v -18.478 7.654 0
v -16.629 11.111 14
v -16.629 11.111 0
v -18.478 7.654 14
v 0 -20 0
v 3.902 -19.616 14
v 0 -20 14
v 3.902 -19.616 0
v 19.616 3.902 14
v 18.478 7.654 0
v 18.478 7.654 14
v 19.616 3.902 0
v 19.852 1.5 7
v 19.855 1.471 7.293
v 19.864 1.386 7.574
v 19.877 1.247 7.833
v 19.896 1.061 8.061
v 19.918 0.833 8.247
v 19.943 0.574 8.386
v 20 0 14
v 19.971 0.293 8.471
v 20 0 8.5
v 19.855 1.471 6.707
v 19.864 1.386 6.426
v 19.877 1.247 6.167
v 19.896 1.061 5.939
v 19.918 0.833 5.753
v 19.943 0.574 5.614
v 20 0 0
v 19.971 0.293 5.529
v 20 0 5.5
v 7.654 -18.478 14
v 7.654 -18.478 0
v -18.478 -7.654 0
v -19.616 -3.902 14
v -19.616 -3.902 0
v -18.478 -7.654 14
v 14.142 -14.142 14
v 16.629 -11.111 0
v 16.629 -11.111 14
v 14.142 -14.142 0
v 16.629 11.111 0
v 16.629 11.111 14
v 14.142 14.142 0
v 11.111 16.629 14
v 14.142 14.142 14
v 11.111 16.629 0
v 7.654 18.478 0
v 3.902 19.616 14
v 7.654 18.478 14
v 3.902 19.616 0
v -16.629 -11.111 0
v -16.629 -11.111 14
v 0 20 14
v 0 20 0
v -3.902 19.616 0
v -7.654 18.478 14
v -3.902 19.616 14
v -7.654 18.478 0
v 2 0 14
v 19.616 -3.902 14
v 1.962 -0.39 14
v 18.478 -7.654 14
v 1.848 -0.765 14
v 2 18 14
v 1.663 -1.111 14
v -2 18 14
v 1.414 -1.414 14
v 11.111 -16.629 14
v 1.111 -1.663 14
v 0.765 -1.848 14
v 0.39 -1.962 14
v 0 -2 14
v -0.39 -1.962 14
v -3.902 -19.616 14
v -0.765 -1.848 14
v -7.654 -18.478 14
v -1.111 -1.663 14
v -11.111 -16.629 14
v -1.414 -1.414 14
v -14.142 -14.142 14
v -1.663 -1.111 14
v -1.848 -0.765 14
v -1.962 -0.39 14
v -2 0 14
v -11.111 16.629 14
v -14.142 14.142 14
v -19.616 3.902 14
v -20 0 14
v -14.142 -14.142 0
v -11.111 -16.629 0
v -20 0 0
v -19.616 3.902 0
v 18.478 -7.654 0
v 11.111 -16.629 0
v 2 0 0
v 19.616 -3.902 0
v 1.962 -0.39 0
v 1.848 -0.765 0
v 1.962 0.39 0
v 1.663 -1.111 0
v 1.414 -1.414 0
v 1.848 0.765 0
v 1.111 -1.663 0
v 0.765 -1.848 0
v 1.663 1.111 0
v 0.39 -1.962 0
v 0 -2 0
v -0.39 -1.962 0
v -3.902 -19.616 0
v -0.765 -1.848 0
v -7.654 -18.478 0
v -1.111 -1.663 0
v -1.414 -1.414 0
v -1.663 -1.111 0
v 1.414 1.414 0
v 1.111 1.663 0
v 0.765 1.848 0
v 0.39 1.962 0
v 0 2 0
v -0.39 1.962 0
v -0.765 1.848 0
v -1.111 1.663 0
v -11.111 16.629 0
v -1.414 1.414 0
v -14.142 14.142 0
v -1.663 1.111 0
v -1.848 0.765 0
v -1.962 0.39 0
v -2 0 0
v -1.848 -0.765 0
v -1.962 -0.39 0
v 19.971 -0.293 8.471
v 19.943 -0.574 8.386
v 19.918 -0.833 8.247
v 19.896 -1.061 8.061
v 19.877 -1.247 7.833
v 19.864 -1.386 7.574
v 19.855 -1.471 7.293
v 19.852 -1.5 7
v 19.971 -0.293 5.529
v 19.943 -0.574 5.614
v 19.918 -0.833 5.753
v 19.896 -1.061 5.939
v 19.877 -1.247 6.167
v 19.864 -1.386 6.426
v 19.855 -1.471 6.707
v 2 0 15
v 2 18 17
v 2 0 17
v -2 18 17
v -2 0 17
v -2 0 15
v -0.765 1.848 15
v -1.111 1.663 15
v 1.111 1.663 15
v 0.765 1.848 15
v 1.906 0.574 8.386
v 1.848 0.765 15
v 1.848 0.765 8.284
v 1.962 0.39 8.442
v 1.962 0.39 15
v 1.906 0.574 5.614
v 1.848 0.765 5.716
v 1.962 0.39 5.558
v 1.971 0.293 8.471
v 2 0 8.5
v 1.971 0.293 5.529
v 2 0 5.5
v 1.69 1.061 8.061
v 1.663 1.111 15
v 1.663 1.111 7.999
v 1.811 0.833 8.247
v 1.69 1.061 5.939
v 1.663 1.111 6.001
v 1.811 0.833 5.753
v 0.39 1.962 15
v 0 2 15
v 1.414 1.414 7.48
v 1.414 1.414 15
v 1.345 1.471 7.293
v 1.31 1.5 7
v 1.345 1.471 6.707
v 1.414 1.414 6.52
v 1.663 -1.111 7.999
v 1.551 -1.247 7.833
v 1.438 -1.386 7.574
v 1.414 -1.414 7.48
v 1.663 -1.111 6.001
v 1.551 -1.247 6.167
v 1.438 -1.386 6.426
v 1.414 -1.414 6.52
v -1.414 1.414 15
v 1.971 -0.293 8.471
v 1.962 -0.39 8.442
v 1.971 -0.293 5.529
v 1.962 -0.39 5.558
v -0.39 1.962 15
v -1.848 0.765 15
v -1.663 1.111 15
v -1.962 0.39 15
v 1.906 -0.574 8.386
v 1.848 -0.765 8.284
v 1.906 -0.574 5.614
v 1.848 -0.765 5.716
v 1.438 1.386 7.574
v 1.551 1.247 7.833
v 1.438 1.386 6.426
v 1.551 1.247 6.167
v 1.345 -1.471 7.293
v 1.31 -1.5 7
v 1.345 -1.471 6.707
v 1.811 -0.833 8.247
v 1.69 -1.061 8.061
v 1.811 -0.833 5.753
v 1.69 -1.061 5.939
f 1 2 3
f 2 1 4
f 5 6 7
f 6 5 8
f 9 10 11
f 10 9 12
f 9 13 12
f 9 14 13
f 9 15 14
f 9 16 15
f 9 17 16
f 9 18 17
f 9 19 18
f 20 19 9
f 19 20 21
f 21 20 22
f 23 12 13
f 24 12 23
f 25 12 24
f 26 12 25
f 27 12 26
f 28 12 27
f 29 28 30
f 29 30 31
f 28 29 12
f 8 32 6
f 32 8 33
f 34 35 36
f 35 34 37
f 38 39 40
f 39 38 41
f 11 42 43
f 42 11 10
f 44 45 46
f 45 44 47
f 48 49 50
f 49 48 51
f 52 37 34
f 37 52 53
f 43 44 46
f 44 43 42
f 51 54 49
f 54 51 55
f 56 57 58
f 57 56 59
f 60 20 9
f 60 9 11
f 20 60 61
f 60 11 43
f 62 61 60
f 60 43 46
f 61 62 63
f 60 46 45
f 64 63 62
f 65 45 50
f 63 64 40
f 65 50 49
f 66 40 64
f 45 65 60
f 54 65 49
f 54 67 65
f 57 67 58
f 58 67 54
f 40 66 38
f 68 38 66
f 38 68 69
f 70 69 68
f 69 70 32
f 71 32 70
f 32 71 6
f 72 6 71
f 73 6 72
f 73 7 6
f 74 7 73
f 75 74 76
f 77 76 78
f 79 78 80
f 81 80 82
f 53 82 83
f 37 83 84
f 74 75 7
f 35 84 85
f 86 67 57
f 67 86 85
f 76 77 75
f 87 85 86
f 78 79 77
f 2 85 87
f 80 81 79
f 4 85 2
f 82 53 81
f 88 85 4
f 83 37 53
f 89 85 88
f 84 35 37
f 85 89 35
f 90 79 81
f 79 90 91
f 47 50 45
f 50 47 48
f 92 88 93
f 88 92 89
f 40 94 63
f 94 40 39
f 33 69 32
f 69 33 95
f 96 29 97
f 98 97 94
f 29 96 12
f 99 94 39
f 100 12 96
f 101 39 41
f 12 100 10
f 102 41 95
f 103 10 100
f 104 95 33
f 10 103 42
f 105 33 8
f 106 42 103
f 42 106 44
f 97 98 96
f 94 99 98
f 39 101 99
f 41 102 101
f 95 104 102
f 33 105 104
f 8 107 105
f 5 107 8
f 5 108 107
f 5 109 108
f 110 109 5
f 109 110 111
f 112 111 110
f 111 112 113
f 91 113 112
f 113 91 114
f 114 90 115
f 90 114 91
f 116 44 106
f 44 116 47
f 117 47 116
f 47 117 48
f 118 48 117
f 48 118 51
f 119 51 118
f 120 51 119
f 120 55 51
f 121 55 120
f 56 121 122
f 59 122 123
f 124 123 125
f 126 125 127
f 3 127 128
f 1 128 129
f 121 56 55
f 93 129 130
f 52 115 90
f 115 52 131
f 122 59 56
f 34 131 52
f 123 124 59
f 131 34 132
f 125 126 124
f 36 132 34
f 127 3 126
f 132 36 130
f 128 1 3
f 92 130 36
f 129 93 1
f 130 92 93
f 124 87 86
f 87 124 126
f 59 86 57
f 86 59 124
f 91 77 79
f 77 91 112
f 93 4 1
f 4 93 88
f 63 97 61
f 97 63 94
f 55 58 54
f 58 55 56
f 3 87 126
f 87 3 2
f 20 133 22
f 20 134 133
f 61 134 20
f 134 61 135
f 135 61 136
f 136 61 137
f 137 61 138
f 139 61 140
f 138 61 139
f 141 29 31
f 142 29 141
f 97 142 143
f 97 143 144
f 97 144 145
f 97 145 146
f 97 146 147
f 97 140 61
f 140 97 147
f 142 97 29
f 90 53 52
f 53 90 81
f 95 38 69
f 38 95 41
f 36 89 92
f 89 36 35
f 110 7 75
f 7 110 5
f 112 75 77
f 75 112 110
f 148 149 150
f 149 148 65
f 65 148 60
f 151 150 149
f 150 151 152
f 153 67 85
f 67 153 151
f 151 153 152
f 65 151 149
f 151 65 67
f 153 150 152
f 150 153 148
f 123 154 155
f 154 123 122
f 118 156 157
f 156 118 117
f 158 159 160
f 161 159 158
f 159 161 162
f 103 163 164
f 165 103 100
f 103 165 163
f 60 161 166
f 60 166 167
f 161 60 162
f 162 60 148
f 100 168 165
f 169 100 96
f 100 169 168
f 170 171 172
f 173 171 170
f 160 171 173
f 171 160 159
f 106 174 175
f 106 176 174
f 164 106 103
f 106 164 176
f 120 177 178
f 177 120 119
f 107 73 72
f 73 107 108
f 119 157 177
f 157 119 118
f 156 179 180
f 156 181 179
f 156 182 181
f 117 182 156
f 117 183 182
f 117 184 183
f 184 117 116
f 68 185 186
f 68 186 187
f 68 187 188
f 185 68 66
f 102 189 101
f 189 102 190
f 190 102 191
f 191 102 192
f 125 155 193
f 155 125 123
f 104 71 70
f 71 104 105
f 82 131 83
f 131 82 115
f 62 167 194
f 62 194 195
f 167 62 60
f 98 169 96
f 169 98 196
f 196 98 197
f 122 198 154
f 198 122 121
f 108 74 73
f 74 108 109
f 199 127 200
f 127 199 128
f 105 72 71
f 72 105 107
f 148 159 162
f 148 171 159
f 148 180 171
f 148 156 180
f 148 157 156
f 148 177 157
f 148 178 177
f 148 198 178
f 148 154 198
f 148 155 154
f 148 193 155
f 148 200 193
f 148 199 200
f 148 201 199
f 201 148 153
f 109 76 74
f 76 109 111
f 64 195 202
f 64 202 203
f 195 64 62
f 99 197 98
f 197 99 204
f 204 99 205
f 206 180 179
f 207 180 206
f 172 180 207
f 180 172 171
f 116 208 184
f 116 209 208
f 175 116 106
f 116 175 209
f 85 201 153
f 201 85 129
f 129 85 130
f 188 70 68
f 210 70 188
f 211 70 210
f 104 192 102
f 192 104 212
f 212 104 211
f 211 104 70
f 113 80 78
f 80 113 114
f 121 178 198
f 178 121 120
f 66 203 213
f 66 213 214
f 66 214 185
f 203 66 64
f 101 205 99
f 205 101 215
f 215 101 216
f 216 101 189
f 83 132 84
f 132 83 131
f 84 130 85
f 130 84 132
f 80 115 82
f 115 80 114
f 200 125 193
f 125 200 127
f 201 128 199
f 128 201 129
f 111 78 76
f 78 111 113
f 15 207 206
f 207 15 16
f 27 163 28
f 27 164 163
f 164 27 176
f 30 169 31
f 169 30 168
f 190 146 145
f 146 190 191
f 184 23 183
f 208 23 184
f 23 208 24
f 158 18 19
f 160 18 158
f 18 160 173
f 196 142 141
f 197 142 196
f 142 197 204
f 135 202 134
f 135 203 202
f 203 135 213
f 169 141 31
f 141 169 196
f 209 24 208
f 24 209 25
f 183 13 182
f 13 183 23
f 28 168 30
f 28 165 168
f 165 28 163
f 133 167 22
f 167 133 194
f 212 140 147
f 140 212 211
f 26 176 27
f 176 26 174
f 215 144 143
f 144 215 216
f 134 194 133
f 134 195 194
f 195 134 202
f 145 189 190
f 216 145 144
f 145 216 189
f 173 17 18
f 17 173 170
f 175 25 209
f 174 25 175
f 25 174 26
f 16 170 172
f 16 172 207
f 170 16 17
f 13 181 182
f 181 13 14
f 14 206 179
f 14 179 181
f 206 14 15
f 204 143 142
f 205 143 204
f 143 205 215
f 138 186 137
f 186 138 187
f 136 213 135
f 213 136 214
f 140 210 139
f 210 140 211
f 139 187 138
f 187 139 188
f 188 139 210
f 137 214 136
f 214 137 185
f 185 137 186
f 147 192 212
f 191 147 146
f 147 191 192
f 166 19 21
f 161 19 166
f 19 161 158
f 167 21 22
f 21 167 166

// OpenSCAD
$fn = 32;

// ----------------------------------------------------------------------
// Control knob: pointer knob
// ----------------------------------------------------------------------

// --- parameters (mm) ---
rib_w = 4;                // pointer rib width
rib_h = 4;                // pointer rib height
knob_d = 40;              // knob body diameter
knob_h = 14;              // knob body height
bore_d = 4;               // shaft bore diameter
set_d = 3;                // set screw bore diameter
fit_tol = 0.05;           // tolerance for press fits, mm
free_tol = 0.3;           // tolerance for clearance fits, mm

rib_poke = rib_h - 1;  // rib height above the top
total_h = knob_h + rib_h - 1;  // overall height

difference() {
  union() {
    cylinder(h = knob_h, d = knob_d);
    translate([-rib_w / 2, 0, knob_h - 1])
      cube([rib_w, knob_d / 2 - 2, rib_h]);
  }
  translate([0, 0, -1]) cylinder(h = knob_h + 2, d = bore_d);
  translate([-1, 0, knob_h / 2]) rotate([0, 90, 0])
    cylinder(h = knob_d / 2 + bore_d / 2 + 2, d = set_d);}
